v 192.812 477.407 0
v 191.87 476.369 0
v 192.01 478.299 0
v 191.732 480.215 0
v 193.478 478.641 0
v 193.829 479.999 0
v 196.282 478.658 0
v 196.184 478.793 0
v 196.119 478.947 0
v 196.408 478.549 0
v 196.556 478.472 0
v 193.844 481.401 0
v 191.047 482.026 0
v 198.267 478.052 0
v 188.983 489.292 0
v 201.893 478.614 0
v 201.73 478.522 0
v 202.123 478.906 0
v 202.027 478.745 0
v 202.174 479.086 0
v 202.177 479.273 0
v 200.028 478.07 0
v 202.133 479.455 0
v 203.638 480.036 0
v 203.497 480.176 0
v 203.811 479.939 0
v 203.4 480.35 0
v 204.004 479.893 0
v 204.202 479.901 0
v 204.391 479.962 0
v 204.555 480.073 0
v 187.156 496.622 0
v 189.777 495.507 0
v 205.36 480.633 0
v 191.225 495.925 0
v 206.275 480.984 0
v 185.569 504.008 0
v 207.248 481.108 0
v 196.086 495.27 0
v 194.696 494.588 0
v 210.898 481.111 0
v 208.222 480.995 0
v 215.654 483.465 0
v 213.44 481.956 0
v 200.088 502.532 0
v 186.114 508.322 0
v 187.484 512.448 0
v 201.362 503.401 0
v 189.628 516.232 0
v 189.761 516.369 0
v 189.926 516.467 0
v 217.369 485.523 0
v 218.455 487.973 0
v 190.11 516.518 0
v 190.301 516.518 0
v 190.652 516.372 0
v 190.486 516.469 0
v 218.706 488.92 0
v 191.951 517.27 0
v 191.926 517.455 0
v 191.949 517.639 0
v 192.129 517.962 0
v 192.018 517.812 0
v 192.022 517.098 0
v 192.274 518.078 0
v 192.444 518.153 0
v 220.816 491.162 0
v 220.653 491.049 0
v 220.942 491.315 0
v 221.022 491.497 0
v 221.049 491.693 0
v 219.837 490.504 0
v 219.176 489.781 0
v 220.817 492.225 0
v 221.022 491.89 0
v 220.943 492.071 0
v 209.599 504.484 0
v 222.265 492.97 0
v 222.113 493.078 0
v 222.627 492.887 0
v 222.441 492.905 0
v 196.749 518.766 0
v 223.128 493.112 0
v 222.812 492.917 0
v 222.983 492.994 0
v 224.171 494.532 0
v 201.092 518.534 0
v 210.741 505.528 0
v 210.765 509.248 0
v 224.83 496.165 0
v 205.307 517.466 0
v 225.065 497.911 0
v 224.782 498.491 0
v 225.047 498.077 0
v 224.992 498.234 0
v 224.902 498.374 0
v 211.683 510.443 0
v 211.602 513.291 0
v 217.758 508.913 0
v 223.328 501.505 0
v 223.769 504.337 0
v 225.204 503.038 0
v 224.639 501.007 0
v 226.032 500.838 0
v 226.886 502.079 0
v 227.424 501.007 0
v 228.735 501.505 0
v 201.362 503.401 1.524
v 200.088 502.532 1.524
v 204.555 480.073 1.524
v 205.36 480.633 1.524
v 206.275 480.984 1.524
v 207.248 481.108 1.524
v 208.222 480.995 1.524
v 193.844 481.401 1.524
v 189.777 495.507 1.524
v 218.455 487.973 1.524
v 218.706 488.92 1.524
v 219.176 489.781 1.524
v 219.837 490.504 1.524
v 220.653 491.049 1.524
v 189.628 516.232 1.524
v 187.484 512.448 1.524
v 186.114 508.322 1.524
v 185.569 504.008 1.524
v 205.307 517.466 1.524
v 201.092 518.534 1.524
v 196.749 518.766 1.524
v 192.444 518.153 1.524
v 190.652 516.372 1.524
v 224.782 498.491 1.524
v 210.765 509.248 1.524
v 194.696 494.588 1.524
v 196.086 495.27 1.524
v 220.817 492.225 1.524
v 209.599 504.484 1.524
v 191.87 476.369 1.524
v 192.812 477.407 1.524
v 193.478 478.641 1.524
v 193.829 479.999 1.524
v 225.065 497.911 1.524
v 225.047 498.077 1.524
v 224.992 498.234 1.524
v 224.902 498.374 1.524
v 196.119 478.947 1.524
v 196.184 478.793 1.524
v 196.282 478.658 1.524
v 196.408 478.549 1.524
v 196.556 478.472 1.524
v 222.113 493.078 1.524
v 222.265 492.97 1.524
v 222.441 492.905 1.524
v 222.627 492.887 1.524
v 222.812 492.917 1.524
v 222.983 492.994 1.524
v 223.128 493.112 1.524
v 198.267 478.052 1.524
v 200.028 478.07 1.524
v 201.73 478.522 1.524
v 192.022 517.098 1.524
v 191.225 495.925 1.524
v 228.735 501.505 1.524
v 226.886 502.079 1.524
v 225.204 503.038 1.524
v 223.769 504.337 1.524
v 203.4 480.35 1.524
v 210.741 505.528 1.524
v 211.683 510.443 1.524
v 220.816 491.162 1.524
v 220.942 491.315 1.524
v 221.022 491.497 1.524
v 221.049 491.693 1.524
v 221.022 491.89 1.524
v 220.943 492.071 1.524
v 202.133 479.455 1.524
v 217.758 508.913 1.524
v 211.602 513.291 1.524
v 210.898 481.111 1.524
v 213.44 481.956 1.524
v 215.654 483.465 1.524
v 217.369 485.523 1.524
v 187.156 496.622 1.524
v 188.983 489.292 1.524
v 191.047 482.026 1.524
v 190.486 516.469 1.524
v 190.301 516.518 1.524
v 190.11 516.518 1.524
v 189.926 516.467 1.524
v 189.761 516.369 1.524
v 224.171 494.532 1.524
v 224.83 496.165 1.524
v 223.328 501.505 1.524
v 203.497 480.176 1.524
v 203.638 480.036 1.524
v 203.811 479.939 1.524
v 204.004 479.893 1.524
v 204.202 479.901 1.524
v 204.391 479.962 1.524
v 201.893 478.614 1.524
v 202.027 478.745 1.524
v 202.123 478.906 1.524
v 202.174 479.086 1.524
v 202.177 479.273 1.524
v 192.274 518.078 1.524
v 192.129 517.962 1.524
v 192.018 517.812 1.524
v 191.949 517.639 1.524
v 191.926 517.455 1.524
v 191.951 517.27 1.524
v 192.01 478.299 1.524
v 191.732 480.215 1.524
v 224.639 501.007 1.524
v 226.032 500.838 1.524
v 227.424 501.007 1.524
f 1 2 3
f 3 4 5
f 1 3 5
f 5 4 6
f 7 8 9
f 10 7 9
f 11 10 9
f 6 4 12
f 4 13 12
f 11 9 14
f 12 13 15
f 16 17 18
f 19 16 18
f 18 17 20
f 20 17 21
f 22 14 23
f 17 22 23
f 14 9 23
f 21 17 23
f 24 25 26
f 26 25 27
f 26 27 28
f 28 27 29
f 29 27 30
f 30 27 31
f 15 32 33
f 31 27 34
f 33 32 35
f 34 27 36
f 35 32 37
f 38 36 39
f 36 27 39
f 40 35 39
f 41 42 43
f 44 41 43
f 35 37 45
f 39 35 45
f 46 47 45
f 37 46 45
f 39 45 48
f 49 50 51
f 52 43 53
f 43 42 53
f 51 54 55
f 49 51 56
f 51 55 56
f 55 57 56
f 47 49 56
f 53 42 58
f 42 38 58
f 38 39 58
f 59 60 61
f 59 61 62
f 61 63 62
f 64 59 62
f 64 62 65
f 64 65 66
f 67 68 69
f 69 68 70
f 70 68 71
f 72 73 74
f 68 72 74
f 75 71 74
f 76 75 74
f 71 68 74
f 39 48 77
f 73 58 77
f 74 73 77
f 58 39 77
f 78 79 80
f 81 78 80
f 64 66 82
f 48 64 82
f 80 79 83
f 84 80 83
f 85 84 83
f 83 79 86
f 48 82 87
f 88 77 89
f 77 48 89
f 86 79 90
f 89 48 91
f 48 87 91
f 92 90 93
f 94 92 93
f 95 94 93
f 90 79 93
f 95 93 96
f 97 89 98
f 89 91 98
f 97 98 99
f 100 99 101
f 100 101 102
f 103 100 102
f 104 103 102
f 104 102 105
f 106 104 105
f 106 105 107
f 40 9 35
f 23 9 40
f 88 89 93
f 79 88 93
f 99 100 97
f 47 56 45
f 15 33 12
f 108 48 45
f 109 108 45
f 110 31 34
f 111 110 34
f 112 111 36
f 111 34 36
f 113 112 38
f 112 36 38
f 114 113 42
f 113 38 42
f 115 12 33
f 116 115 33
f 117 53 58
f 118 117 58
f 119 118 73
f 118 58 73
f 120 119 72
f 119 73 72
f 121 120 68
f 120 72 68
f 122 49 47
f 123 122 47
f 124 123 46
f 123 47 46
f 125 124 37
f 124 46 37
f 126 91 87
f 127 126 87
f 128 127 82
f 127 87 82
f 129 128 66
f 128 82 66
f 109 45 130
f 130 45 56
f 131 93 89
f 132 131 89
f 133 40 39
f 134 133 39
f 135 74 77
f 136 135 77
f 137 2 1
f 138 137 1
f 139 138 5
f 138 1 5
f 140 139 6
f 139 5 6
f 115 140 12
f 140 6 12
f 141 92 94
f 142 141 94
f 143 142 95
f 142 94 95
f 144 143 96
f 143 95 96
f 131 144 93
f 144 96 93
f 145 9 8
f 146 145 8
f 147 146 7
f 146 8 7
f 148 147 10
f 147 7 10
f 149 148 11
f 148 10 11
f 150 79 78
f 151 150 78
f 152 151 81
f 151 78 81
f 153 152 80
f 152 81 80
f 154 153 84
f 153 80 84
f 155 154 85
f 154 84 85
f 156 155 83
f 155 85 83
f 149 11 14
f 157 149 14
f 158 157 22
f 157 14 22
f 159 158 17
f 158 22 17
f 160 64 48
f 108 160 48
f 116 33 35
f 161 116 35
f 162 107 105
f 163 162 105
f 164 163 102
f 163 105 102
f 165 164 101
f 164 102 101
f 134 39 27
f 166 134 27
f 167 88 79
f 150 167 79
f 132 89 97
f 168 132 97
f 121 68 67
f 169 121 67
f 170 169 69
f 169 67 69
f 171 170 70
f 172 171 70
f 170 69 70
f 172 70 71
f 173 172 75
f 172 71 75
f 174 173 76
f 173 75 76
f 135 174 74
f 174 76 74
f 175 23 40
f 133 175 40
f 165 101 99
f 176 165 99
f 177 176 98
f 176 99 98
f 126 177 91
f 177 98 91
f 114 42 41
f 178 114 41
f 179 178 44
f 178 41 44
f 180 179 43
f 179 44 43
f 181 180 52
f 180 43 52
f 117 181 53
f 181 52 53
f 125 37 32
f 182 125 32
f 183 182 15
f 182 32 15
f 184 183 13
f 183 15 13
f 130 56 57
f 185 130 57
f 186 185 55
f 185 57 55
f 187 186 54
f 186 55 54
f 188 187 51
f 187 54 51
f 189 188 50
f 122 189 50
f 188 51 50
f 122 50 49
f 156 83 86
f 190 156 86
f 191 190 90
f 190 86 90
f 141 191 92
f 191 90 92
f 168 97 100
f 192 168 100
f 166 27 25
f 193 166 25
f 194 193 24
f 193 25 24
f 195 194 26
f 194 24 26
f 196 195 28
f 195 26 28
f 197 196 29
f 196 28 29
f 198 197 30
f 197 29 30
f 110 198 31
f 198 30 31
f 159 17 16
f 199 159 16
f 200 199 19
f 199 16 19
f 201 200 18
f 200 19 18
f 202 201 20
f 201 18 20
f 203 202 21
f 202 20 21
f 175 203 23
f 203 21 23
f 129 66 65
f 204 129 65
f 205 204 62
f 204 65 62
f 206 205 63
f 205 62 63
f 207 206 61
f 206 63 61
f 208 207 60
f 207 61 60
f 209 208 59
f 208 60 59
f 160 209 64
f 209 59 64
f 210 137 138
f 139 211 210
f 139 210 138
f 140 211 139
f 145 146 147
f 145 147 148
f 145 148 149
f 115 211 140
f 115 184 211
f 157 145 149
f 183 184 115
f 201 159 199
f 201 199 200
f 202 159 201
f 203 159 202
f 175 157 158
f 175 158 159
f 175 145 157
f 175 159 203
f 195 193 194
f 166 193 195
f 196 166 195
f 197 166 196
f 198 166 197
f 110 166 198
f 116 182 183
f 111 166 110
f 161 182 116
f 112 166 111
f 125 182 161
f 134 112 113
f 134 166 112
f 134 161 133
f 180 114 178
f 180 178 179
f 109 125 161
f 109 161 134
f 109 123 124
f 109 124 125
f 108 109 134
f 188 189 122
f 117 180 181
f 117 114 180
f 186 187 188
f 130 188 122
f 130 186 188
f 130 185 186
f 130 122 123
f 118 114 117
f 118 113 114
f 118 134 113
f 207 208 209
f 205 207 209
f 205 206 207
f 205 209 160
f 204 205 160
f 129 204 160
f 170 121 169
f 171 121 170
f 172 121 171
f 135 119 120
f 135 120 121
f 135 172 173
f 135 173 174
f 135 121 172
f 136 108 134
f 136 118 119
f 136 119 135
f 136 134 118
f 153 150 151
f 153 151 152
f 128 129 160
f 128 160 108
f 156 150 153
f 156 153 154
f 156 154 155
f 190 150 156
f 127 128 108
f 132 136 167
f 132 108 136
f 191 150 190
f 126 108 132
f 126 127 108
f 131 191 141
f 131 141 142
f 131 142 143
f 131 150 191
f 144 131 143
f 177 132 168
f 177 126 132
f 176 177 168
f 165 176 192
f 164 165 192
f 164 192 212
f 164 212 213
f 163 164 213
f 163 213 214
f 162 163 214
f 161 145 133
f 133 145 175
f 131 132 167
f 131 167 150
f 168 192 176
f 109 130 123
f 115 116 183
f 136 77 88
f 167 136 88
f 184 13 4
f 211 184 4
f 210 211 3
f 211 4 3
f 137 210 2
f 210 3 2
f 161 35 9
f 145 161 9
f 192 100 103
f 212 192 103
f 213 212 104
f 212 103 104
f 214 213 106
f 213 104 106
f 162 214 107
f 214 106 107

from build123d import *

# Parameters (mm, degrees)
BOSS_EXTRUDE1_DEPTH = 1.524


with BuildPart() as part:
    # Sketch1 → Boss-Extrude1 (new body)
    with BuildSketch(Plane.XY):
        with BuildLine():
            Line((189.777315793, 495.507175139), (191.224820624, 495.924635056))
            Line((191.224820624, 495.924635056), (196.119223328, 478.946810438))
            ThreePointArc((196.119223328, 478.946810438), (196.281524624, 478.657917117), (196.555651913, 478.471757801))
            ThreePointArc((196.555651913, 478.471757801), (199.147753156, 478.005869728), (201.730327533, 478.521960937))
            ThreePointArc((201.730327533, 478.521960937), (202.122931571, 478.905936562), (202.132531096, 479.455011294))
            Line((202.132531096, 479.455011294), (194.696378786, 494.588452914))
            Line((194.696378786, 494.588452914), (196.085953758, 495.269690236))
            Line((196.085953758, 495.269690236), (203.4004902, 480.349637502))
            ThreePointArc((203.4004902, 480.349637502), (203.905544625, 479.909328052), (204.555334637, 480.072806873))
            ThreePointArc((204.555334637, 480.072806873), (206.275233543, 480.984321258), (208.221715491, 480.995218384))
            ThreePointArc((208.221715491, 480.995218384), (214.599649086, 482.633856482), (218.454712821, 487.972550644))
            ThreePointArc((218.454712821, 487.972550644), (219.175843378, 489.780555467), (220.652597524, 491.048667416))
            ThreePointArc((220.652597524, 491.048667416), (221.042127495, 491.593845171), (220.816722181, 492.224832356))
            Line((220.816722181, 492.224832356), (209.599367356, 504.483762477))
            Line((209.599367356, 504.483762477), (210.741099412, 505.528487706))
            Line((210.741099412, 505.528487706), (222.112676203, 493.07840105))
            ThreePointArc((222.112676203, 493.07840105), (222.627317714, 492.886778176), (223.128167093, 493.112000535))
            ThreePointArc((223.128167093, 493.112000535), (224.551927983, 495.327614554), (225.065041618, 497.910782173))
            ThreePointArc((225.065041618, 497.910782173), (224.99187518, 498.233965919), (224.782226996, 498.490575936))
            Line((224.782226996, 498.490575936), (210.765290937, 509.248234144))
            Line((210.765290937, 509.248234144), (211.682631799, 510.443235718))
            Line((211.682631799, 510.443235718), (223.328487329, 501.504872294))
            ThreePointArc((223.328487329, 501.504872294), (226.03151825, 500.838137649), (228.73454917, 501.504872294))
            ThreePointArc((228.73454917, 501.504872294), (226.018822109, 502.512994153), (223.768735069, 504.337436936))
            ThreePointArc((223.768735069, 504.337436936), (214.697892634, 511.126772614), (205.306886221, 517.465878226))
            ThreePointArc((205.306886221, 517.465878226), (198.926193665, 518.755629479), (192.444429164, 518.152782293))
            ThreePointArc((192.444429164, 518.152782293), (191.977714673, 517.727994557), (192.022339489, 517.098490258))
            Line((192.022339489, 517.098490258), (201.361944543, 503.400969482))
            Line((201.361944543, 503.400969482), (200.088434986, 502.532398479))
            Line((200.088434986, 502.532398479), (190.651660212, 516.372267313))
            ThreePointArc((190.651660212, 516.372267313), (190.110139611, 516.517556306), (189.627566711, 516.232114806))
            ThreePointArc((189.627566711, 516.232114806), (186.698797428, 510.418423529), (185.568771317, 504.007515889))
            ThreePointArc((185.568771317, 504.007515889), (188.039633015, 492.949934603), (191.046560533, 482.025940447))
            ThreePointArc((191.046560533, 482.025940447), (191.923055704, 479.264919011), (191.869552453, 476.368607468))
            ThreePointArc((191.869552453, 476.368607468), (193.477546562, 478.641329665), (193.844210588, 481.401124718))
            Line((193.844210588, 481.401124718), (189.777315793, 495.507175139))
        make_face()
    extrude(amount=BOSS_EXTRUDE1_DEPTH)


solid = part.part
